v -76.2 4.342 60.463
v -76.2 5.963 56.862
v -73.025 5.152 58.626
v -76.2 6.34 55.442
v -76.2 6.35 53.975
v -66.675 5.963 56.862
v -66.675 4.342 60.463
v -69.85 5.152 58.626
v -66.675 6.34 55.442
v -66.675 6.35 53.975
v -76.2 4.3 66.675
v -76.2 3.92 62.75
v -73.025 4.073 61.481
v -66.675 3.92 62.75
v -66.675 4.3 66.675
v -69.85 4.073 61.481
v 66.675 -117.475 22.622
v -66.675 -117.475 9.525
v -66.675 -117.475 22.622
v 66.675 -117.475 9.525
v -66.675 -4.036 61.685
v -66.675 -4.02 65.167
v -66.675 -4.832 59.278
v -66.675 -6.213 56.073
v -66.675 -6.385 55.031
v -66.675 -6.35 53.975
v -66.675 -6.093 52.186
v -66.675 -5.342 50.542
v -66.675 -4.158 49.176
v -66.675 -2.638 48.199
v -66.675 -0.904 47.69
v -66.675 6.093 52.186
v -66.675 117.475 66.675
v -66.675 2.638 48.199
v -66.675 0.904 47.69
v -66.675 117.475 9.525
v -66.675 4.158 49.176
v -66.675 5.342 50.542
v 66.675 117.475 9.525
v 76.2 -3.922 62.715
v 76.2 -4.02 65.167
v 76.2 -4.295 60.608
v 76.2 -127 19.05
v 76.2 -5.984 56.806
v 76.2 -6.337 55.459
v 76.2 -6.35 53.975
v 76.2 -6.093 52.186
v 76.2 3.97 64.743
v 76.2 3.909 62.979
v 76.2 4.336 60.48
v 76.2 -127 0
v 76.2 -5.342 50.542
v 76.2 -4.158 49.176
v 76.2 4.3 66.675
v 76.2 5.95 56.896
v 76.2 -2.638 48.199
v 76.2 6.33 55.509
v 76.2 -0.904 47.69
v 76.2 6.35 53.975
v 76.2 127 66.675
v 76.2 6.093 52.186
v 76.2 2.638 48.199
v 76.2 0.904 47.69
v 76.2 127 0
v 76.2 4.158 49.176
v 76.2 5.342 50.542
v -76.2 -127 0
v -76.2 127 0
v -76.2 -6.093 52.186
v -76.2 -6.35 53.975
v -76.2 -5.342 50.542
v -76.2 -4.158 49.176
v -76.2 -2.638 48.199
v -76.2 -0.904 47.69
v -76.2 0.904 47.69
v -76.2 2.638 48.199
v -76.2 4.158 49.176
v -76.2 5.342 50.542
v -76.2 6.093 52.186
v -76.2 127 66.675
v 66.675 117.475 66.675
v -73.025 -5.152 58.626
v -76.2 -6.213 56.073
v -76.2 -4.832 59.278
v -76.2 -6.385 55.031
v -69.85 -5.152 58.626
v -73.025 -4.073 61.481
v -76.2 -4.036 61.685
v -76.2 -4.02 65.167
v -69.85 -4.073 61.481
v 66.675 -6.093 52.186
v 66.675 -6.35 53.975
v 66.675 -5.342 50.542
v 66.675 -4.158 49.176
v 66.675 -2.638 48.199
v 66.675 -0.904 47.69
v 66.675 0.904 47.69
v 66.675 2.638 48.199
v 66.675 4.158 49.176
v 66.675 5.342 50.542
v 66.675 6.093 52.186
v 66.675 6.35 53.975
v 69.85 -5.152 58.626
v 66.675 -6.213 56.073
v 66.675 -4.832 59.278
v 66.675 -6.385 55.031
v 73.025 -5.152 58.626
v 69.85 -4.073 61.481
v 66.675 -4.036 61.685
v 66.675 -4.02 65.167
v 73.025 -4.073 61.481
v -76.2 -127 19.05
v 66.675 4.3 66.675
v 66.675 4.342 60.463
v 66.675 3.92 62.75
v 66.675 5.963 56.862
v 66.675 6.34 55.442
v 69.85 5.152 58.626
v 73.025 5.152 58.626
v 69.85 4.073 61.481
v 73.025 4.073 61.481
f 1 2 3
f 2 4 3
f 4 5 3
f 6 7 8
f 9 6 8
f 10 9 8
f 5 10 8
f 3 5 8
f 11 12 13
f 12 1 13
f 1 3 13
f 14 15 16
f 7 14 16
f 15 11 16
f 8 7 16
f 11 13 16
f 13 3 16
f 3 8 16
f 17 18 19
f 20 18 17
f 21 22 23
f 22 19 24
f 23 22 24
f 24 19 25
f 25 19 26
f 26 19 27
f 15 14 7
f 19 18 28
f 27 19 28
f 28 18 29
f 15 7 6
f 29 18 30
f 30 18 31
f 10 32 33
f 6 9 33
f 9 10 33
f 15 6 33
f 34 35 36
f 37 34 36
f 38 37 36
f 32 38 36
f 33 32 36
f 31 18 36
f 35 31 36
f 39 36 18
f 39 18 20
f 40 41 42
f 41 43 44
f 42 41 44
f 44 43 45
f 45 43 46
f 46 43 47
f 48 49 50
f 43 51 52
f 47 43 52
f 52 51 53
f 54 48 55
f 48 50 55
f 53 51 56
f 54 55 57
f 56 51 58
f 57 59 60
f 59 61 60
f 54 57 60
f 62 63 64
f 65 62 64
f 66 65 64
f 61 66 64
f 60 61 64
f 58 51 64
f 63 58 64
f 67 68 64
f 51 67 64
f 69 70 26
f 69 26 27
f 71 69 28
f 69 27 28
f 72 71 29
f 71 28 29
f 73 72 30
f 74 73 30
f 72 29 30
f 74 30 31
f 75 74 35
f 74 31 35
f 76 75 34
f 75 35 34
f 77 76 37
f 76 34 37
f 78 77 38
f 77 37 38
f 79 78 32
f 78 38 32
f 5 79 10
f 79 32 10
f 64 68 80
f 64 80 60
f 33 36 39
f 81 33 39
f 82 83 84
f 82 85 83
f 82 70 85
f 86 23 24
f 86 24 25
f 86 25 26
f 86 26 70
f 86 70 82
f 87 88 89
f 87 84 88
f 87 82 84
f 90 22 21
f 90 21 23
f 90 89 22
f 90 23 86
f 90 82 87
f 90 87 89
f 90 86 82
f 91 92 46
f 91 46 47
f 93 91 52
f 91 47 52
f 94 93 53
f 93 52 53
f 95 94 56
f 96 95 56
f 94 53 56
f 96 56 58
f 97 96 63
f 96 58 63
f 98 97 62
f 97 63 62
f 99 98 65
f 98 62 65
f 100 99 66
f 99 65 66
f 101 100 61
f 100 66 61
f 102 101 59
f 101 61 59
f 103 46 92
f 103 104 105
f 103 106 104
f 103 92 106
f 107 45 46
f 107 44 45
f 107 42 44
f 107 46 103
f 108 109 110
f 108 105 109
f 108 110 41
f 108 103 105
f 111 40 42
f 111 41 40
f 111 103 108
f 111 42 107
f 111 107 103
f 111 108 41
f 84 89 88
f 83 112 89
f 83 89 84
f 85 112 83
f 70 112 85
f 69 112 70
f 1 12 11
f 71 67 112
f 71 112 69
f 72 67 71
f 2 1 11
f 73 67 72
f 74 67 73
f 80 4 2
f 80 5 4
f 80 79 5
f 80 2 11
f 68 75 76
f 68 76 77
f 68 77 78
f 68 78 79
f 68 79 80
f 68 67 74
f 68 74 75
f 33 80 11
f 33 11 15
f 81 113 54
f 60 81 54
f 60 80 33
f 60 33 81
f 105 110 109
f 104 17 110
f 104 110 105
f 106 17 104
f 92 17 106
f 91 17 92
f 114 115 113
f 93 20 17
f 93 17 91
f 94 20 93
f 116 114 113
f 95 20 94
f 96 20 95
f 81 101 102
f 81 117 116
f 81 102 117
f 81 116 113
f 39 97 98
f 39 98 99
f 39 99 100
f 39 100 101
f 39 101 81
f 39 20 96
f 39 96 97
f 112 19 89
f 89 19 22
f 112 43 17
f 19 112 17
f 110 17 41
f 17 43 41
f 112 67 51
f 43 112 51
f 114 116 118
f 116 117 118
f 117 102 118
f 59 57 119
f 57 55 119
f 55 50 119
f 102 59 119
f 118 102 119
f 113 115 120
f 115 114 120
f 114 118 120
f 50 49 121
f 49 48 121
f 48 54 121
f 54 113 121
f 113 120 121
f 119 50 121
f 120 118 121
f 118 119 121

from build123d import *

# Parameters (mm, degrees)
F0_W     = 152.4
F0_H     = 254
F1_DEPTH = 9.525
F2_W     = 152.4
F2_H     = 254
F2_W_2   = 133.35
F2_H_2   = 234.95
F3_DEPTH = 57.15
F5_DEPTH = 152.401


with BuildPart() as f1:
    # F0 (on Top) → F1 (new body)
    with BuildSketch(Plane.XY):
        Rectangle(F0_W, F0_H)
    extrude(amount=F1_DEPTH)

    # F2 (on face) → F3 (join)
    with BuildSketch(Plane.XY.offset(9.525)):
        Rectangle(F2_W, F2_H)
        Rectangle(F2_W_2, F2_H_2, mode=Mode.SUBTRACT)
    extrude(amount=F3_DEPTH)

    # F4 (on face) → F5 (cut, through all)
    with BuildSketch(Plane.YZ.offset(76.2)):
        with BuildLine():
            Line((-127, 66.675), (-127, 19.05))
            Line((-127, 19.05), (-4.0201239704, 65.1674535111))
            add(Edge.make_bspline(
                [(-4.0201239704, 65.1674535111), (-4.084887365, 65.6563585182), (-4.1772574136, 66.1605990618), (-4.3000844307, 66.675)],
                knots=[0.9047570689, 0.9047570689, 0.9047570689, 0.9047570689, 1, 1, 1, 1], degree=3))
            Line((-4.3000844307, 66.675), (-127, 66.675))
        make_face()
        with BuildLine():
            Line((0, 66.675), (-4.0201239704, 65.1674535111))
            add(Edge.make_bspline(
                [(-6.35, 53.975), (-6.6047369801, 55.8170739007), (-5.1216855945, 58.6204590718), (-3.916212623, 61.1924199541), (-3.8355720634, 63.7742536647), (-4.0201239704, 65.1674535111)],
                knots=[0, 0, 0, 0, 0.3524232767, 0.6333496684, 0.9047570689, 0.9047570689, 0.9047570689, 0.9047570689], degree=3))
            ThreePointArc((-6.35, 53.975), (0, 60.325), (6.35, 53.975))
            add(Edge.make_bspline(
                [(6.35, 53.975), (6.6047369801, 55.8170739007), (5.1216855945, 58.6204590718), (3.7893136098, 61.4631678727), (3.8272454912, 64.6947451687), (4.3000844307, 66.675)],
                knots=[0, 0, 0, 0, 0.3524232767, 0.6333496684, 1, 1, 1, 1], degree=3))
            Line((4.3000844307, 66.675), (0, 66.675))
        make_face()
        with BuildLine():
            ThreePointArc((6.35, 53.975), (0, 60.325), (-6.35, 53.975))
            ThreePointArc((-6.35, 53.975), (0, 47.625), (6.35, 53.975))
        make_face()
        with BuildLine():
            add(Edge.make_bspline(
                [(-4.0201239704, 65.1674535111), (-4.084887365, 65.6563585182), (-4.1772574136, 66.1605990618), (-4.3000844307, 66.675)],
                knots=[0.9047570689, 0.9047570689, 0.9047570689, 0.9047570689, 1, 1, 1, 1], degree=3))
            Line((-4.0201239704, 65.1674535111), (0, 66.675))
            Line((0, 66.675), (-4.3000844307, 66.675))
        make_face()
    extrude(amount=-F5_DEPTH, mode=Mode.SUBTRACT)


solid = f1.part
